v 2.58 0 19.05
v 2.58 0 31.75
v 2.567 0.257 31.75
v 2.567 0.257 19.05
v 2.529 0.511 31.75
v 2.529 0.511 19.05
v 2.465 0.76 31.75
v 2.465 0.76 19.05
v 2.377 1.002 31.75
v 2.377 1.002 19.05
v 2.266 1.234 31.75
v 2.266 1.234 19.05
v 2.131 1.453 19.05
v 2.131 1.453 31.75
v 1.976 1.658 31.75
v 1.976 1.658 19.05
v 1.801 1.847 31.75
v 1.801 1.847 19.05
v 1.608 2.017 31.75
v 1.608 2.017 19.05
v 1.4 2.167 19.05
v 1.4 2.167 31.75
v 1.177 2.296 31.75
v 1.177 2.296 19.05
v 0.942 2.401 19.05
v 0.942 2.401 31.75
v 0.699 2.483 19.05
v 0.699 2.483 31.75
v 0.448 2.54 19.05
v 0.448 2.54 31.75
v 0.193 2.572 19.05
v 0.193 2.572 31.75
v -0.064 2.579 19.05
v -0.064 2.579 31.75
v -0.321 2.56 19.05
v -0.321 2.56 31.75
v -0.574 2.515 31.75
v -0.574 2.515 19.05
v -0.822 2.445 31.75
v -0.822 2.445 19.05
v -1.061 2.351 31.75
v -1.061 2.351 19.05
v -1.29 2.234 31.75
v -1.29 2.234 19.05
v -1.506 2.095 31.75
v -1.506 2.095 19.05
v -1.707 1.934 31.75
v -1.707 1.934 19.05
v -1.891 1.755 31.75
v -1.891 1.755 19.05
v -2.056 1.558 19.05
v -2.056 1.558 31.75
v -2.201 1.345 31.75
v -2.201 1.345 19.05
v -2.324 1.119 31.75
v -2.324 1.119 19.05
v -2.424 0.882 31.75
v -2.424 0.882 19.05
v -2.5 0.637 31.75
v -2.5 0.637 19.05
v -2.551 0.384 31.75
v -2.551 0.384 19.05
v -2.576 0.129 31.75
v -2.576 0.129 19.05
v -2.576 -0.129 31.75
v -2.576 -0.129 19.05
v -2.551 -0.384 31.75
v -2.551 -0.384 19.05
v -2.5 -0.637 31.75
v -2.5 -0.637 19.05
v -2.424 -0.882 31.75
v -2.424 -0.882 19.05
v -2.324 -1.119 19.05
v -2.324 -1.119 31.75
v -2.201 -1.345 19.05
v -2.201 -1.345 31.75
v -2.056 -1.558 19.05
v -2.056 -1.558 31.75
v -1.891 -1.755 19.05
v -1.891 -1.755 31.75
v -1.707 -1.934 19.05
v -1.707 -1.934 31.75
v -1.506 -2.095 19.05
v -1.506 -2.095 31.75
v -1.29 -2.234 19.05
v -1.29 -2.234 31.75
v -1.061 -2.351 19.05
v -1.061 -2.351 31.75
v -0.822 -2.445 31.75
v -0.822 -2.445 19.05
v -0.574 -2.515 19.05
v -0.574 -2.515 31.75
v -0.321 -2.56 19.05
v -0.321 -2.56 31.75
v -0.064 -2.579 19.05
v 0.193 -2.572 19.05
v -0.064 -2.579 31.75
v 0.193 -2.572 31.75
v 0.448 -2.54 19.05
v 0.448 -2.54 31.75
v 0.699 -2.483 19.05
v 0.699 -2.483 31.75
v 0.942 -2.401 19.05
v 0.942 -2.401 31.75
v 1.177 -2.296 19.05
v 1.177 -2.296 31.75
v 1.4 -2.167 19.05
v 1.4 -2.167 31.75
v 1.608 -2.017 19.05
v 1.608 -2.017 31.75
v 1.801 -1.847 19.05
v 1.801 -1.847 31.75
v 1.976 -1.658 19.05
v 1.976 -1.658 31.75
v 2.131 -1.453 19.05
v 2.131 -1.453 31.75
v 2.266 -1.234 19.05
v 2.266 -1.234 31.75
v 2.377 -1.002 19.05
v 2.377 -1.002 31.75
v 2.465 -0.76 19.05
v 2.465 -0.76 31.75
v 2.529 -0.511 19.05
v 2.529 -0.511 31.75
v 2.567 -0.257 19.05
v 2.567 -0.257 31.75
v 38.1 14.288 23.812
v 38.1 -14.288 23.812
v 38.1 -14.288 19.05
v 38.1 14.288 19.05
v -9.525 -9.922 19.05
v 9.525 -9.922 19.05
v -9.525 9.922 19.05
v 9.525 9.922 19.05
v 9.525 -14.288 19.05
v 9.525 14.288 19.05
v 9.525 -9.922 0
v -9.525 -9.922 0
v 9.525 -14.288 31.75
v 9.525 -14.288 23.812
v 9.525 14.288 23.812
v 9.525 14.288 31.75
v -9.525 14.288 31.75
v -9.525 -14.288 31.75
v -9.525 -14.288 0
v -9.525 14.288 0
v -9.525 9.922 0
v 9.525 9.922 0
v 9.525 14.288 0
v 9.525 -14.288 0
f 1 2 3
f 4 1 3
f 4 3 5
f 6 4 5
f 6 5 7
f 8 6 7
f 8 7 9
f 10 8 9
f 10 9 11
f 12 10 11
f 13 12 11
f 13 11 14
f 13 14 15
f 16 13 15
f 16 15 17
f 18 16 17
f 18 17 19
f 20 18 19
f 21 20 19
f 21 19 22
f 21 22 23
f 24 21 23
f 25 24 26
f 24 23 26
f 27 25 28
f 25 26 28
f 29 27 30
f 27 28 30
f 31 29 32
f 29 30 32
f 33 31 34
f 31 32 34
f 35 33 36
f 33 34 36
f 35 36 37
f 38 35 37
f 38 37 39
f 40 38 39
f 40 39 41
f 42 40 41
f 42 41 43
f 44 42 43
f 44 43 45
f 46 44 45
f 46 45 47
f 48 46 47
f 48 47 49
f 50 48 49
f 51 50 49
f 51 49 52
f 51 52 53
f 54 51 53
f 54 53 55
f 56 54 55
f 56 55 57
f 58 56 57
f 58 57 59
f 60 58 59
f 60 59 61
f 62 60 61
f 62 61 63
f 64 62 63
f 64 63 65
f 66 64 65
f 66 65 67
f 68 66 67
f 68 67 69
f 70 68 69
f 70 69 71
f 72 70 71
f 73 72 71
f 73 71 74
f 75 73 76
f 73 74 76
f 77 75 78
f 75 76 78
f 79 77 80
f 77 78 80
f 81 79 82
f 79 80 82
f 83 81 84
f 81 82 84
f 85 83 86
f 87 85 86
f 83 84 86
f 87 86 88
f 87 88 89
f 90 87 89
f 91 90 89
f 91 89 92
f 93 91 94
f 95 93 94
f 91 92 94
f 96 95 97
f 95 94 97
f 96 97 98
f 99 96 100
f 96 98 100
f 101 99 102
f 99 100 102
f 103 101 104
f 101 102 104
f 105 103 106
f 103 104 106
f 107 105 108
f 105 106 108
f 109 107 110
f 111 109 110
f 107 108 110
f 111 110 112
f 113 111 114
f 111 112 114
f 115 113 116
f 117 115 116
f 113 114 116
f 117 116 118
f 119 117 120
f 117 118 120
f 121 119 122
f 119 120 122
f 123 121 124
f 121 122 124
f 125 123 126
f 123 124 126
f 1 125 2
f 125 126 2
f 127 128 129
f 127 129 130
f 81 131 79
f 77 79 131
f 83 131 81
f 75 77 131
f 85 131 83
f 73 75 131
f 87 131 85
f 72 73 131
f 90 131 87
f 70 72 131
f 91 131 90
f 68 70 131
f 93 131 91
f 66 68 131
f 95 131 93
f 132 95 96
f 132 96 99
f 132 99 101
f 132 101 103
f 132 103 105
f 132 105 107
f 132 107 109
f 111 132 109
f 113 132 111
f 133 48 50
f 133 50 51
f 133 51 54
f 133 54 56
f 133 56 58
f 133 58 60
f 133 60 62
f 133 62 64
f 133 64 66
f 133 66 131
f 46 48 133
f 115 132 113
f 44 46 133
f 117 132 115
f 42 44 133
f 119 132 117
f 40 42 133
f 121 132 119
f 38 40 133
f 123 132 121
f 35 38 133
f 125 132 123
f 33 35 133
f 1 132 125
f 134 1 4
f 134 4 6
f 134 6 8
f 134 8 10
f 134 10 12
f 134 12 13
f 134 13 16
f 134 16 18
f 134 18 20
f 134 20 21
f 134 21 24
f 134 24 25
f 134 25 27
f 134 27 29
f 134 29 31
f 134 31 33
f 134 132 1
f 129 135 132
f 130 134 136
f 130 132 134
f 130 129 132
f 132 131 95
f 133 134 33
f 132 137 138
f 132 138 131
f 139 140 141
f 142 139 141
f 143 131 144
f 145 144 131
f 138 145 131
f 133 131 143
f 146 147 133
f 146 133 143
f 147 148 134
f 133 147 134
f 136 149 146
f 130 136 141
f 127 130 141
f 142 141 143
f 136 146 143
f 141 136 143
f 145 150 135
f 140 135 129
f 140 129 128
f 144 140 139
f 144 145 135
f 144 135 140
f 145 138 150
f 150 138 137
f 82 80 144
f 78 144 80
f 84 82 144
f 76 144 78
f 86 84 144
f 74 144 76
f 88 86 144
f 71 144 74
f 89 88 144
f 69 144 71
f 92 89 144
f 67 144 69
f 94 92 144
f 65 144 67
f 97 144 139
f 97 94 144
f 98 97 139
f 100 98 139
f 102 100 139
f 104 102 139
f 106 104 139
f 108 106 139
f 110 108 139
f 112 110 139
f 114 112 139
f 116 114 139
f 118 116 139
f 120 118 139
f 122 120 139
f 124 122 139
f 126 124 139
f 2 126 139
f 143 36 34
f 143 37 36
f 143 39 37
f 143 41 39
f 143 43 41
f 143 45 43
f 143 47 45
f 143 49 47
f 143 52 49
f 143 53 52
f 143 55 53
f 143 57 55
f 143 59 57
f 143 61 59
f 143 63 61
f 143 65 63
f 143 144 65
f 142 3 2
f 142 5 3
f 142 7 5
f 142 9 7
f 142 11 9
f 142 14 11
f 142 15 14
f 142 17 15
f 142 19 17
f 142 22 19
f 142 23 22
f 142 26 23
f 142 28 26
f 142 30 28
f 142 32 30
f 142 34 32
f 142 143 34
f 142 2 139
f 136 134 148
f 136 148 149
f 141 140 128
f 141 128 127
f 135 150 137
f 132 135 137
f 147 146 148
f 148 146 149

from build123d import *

# Parameters (mm, degrees)
F0_W     = 19.05
F0_H     = 28.575
F1_DEPTH = 31.75
F2_W     = 19.84375
F2_H     = 19.05
F3_DEPTH = 19.051
F4_W     = 28.575
F4_H     = 4.7625
F5_DEPTH = 38.1
F6_R     = 2.579688
F7_DEPTH = 31.751


with BuildPart() as f1:
    # F0 (on Top) → F1 (new body)
    with BuildSketch(Plane.XY):
        Rectangle(F0_W, F0_H)
    extrude(amount=F1_DEPTH)

    # F2 (on face) → F3 (cut, through all)
    with BuildSketch(Plane.YZ.offset(9.525)):
        with Locations((0, 9.525)):
            Rectangle(F2_W, F2_H)
    extrude(amount=-F3_DEPTH, mode=Mode.SUBTRACT)

    # F4 (on Right) → F5 (join)
    with BuildSketch(Plane.YZ):
        with Locations((0, 21.43125)):
            Rectangle(F4_W, F4_H)
    extrude(amount=F5_DEPTH)

    # F6 (on face) → F7 (cut, through all)
    with BuildSketch(Plane.XY.offset(31.75)):
        Circle(F6_R)
    extrude(amount=-F7_DEPTH, mode=Mode.SUBTRACT)


solid = f1.part
